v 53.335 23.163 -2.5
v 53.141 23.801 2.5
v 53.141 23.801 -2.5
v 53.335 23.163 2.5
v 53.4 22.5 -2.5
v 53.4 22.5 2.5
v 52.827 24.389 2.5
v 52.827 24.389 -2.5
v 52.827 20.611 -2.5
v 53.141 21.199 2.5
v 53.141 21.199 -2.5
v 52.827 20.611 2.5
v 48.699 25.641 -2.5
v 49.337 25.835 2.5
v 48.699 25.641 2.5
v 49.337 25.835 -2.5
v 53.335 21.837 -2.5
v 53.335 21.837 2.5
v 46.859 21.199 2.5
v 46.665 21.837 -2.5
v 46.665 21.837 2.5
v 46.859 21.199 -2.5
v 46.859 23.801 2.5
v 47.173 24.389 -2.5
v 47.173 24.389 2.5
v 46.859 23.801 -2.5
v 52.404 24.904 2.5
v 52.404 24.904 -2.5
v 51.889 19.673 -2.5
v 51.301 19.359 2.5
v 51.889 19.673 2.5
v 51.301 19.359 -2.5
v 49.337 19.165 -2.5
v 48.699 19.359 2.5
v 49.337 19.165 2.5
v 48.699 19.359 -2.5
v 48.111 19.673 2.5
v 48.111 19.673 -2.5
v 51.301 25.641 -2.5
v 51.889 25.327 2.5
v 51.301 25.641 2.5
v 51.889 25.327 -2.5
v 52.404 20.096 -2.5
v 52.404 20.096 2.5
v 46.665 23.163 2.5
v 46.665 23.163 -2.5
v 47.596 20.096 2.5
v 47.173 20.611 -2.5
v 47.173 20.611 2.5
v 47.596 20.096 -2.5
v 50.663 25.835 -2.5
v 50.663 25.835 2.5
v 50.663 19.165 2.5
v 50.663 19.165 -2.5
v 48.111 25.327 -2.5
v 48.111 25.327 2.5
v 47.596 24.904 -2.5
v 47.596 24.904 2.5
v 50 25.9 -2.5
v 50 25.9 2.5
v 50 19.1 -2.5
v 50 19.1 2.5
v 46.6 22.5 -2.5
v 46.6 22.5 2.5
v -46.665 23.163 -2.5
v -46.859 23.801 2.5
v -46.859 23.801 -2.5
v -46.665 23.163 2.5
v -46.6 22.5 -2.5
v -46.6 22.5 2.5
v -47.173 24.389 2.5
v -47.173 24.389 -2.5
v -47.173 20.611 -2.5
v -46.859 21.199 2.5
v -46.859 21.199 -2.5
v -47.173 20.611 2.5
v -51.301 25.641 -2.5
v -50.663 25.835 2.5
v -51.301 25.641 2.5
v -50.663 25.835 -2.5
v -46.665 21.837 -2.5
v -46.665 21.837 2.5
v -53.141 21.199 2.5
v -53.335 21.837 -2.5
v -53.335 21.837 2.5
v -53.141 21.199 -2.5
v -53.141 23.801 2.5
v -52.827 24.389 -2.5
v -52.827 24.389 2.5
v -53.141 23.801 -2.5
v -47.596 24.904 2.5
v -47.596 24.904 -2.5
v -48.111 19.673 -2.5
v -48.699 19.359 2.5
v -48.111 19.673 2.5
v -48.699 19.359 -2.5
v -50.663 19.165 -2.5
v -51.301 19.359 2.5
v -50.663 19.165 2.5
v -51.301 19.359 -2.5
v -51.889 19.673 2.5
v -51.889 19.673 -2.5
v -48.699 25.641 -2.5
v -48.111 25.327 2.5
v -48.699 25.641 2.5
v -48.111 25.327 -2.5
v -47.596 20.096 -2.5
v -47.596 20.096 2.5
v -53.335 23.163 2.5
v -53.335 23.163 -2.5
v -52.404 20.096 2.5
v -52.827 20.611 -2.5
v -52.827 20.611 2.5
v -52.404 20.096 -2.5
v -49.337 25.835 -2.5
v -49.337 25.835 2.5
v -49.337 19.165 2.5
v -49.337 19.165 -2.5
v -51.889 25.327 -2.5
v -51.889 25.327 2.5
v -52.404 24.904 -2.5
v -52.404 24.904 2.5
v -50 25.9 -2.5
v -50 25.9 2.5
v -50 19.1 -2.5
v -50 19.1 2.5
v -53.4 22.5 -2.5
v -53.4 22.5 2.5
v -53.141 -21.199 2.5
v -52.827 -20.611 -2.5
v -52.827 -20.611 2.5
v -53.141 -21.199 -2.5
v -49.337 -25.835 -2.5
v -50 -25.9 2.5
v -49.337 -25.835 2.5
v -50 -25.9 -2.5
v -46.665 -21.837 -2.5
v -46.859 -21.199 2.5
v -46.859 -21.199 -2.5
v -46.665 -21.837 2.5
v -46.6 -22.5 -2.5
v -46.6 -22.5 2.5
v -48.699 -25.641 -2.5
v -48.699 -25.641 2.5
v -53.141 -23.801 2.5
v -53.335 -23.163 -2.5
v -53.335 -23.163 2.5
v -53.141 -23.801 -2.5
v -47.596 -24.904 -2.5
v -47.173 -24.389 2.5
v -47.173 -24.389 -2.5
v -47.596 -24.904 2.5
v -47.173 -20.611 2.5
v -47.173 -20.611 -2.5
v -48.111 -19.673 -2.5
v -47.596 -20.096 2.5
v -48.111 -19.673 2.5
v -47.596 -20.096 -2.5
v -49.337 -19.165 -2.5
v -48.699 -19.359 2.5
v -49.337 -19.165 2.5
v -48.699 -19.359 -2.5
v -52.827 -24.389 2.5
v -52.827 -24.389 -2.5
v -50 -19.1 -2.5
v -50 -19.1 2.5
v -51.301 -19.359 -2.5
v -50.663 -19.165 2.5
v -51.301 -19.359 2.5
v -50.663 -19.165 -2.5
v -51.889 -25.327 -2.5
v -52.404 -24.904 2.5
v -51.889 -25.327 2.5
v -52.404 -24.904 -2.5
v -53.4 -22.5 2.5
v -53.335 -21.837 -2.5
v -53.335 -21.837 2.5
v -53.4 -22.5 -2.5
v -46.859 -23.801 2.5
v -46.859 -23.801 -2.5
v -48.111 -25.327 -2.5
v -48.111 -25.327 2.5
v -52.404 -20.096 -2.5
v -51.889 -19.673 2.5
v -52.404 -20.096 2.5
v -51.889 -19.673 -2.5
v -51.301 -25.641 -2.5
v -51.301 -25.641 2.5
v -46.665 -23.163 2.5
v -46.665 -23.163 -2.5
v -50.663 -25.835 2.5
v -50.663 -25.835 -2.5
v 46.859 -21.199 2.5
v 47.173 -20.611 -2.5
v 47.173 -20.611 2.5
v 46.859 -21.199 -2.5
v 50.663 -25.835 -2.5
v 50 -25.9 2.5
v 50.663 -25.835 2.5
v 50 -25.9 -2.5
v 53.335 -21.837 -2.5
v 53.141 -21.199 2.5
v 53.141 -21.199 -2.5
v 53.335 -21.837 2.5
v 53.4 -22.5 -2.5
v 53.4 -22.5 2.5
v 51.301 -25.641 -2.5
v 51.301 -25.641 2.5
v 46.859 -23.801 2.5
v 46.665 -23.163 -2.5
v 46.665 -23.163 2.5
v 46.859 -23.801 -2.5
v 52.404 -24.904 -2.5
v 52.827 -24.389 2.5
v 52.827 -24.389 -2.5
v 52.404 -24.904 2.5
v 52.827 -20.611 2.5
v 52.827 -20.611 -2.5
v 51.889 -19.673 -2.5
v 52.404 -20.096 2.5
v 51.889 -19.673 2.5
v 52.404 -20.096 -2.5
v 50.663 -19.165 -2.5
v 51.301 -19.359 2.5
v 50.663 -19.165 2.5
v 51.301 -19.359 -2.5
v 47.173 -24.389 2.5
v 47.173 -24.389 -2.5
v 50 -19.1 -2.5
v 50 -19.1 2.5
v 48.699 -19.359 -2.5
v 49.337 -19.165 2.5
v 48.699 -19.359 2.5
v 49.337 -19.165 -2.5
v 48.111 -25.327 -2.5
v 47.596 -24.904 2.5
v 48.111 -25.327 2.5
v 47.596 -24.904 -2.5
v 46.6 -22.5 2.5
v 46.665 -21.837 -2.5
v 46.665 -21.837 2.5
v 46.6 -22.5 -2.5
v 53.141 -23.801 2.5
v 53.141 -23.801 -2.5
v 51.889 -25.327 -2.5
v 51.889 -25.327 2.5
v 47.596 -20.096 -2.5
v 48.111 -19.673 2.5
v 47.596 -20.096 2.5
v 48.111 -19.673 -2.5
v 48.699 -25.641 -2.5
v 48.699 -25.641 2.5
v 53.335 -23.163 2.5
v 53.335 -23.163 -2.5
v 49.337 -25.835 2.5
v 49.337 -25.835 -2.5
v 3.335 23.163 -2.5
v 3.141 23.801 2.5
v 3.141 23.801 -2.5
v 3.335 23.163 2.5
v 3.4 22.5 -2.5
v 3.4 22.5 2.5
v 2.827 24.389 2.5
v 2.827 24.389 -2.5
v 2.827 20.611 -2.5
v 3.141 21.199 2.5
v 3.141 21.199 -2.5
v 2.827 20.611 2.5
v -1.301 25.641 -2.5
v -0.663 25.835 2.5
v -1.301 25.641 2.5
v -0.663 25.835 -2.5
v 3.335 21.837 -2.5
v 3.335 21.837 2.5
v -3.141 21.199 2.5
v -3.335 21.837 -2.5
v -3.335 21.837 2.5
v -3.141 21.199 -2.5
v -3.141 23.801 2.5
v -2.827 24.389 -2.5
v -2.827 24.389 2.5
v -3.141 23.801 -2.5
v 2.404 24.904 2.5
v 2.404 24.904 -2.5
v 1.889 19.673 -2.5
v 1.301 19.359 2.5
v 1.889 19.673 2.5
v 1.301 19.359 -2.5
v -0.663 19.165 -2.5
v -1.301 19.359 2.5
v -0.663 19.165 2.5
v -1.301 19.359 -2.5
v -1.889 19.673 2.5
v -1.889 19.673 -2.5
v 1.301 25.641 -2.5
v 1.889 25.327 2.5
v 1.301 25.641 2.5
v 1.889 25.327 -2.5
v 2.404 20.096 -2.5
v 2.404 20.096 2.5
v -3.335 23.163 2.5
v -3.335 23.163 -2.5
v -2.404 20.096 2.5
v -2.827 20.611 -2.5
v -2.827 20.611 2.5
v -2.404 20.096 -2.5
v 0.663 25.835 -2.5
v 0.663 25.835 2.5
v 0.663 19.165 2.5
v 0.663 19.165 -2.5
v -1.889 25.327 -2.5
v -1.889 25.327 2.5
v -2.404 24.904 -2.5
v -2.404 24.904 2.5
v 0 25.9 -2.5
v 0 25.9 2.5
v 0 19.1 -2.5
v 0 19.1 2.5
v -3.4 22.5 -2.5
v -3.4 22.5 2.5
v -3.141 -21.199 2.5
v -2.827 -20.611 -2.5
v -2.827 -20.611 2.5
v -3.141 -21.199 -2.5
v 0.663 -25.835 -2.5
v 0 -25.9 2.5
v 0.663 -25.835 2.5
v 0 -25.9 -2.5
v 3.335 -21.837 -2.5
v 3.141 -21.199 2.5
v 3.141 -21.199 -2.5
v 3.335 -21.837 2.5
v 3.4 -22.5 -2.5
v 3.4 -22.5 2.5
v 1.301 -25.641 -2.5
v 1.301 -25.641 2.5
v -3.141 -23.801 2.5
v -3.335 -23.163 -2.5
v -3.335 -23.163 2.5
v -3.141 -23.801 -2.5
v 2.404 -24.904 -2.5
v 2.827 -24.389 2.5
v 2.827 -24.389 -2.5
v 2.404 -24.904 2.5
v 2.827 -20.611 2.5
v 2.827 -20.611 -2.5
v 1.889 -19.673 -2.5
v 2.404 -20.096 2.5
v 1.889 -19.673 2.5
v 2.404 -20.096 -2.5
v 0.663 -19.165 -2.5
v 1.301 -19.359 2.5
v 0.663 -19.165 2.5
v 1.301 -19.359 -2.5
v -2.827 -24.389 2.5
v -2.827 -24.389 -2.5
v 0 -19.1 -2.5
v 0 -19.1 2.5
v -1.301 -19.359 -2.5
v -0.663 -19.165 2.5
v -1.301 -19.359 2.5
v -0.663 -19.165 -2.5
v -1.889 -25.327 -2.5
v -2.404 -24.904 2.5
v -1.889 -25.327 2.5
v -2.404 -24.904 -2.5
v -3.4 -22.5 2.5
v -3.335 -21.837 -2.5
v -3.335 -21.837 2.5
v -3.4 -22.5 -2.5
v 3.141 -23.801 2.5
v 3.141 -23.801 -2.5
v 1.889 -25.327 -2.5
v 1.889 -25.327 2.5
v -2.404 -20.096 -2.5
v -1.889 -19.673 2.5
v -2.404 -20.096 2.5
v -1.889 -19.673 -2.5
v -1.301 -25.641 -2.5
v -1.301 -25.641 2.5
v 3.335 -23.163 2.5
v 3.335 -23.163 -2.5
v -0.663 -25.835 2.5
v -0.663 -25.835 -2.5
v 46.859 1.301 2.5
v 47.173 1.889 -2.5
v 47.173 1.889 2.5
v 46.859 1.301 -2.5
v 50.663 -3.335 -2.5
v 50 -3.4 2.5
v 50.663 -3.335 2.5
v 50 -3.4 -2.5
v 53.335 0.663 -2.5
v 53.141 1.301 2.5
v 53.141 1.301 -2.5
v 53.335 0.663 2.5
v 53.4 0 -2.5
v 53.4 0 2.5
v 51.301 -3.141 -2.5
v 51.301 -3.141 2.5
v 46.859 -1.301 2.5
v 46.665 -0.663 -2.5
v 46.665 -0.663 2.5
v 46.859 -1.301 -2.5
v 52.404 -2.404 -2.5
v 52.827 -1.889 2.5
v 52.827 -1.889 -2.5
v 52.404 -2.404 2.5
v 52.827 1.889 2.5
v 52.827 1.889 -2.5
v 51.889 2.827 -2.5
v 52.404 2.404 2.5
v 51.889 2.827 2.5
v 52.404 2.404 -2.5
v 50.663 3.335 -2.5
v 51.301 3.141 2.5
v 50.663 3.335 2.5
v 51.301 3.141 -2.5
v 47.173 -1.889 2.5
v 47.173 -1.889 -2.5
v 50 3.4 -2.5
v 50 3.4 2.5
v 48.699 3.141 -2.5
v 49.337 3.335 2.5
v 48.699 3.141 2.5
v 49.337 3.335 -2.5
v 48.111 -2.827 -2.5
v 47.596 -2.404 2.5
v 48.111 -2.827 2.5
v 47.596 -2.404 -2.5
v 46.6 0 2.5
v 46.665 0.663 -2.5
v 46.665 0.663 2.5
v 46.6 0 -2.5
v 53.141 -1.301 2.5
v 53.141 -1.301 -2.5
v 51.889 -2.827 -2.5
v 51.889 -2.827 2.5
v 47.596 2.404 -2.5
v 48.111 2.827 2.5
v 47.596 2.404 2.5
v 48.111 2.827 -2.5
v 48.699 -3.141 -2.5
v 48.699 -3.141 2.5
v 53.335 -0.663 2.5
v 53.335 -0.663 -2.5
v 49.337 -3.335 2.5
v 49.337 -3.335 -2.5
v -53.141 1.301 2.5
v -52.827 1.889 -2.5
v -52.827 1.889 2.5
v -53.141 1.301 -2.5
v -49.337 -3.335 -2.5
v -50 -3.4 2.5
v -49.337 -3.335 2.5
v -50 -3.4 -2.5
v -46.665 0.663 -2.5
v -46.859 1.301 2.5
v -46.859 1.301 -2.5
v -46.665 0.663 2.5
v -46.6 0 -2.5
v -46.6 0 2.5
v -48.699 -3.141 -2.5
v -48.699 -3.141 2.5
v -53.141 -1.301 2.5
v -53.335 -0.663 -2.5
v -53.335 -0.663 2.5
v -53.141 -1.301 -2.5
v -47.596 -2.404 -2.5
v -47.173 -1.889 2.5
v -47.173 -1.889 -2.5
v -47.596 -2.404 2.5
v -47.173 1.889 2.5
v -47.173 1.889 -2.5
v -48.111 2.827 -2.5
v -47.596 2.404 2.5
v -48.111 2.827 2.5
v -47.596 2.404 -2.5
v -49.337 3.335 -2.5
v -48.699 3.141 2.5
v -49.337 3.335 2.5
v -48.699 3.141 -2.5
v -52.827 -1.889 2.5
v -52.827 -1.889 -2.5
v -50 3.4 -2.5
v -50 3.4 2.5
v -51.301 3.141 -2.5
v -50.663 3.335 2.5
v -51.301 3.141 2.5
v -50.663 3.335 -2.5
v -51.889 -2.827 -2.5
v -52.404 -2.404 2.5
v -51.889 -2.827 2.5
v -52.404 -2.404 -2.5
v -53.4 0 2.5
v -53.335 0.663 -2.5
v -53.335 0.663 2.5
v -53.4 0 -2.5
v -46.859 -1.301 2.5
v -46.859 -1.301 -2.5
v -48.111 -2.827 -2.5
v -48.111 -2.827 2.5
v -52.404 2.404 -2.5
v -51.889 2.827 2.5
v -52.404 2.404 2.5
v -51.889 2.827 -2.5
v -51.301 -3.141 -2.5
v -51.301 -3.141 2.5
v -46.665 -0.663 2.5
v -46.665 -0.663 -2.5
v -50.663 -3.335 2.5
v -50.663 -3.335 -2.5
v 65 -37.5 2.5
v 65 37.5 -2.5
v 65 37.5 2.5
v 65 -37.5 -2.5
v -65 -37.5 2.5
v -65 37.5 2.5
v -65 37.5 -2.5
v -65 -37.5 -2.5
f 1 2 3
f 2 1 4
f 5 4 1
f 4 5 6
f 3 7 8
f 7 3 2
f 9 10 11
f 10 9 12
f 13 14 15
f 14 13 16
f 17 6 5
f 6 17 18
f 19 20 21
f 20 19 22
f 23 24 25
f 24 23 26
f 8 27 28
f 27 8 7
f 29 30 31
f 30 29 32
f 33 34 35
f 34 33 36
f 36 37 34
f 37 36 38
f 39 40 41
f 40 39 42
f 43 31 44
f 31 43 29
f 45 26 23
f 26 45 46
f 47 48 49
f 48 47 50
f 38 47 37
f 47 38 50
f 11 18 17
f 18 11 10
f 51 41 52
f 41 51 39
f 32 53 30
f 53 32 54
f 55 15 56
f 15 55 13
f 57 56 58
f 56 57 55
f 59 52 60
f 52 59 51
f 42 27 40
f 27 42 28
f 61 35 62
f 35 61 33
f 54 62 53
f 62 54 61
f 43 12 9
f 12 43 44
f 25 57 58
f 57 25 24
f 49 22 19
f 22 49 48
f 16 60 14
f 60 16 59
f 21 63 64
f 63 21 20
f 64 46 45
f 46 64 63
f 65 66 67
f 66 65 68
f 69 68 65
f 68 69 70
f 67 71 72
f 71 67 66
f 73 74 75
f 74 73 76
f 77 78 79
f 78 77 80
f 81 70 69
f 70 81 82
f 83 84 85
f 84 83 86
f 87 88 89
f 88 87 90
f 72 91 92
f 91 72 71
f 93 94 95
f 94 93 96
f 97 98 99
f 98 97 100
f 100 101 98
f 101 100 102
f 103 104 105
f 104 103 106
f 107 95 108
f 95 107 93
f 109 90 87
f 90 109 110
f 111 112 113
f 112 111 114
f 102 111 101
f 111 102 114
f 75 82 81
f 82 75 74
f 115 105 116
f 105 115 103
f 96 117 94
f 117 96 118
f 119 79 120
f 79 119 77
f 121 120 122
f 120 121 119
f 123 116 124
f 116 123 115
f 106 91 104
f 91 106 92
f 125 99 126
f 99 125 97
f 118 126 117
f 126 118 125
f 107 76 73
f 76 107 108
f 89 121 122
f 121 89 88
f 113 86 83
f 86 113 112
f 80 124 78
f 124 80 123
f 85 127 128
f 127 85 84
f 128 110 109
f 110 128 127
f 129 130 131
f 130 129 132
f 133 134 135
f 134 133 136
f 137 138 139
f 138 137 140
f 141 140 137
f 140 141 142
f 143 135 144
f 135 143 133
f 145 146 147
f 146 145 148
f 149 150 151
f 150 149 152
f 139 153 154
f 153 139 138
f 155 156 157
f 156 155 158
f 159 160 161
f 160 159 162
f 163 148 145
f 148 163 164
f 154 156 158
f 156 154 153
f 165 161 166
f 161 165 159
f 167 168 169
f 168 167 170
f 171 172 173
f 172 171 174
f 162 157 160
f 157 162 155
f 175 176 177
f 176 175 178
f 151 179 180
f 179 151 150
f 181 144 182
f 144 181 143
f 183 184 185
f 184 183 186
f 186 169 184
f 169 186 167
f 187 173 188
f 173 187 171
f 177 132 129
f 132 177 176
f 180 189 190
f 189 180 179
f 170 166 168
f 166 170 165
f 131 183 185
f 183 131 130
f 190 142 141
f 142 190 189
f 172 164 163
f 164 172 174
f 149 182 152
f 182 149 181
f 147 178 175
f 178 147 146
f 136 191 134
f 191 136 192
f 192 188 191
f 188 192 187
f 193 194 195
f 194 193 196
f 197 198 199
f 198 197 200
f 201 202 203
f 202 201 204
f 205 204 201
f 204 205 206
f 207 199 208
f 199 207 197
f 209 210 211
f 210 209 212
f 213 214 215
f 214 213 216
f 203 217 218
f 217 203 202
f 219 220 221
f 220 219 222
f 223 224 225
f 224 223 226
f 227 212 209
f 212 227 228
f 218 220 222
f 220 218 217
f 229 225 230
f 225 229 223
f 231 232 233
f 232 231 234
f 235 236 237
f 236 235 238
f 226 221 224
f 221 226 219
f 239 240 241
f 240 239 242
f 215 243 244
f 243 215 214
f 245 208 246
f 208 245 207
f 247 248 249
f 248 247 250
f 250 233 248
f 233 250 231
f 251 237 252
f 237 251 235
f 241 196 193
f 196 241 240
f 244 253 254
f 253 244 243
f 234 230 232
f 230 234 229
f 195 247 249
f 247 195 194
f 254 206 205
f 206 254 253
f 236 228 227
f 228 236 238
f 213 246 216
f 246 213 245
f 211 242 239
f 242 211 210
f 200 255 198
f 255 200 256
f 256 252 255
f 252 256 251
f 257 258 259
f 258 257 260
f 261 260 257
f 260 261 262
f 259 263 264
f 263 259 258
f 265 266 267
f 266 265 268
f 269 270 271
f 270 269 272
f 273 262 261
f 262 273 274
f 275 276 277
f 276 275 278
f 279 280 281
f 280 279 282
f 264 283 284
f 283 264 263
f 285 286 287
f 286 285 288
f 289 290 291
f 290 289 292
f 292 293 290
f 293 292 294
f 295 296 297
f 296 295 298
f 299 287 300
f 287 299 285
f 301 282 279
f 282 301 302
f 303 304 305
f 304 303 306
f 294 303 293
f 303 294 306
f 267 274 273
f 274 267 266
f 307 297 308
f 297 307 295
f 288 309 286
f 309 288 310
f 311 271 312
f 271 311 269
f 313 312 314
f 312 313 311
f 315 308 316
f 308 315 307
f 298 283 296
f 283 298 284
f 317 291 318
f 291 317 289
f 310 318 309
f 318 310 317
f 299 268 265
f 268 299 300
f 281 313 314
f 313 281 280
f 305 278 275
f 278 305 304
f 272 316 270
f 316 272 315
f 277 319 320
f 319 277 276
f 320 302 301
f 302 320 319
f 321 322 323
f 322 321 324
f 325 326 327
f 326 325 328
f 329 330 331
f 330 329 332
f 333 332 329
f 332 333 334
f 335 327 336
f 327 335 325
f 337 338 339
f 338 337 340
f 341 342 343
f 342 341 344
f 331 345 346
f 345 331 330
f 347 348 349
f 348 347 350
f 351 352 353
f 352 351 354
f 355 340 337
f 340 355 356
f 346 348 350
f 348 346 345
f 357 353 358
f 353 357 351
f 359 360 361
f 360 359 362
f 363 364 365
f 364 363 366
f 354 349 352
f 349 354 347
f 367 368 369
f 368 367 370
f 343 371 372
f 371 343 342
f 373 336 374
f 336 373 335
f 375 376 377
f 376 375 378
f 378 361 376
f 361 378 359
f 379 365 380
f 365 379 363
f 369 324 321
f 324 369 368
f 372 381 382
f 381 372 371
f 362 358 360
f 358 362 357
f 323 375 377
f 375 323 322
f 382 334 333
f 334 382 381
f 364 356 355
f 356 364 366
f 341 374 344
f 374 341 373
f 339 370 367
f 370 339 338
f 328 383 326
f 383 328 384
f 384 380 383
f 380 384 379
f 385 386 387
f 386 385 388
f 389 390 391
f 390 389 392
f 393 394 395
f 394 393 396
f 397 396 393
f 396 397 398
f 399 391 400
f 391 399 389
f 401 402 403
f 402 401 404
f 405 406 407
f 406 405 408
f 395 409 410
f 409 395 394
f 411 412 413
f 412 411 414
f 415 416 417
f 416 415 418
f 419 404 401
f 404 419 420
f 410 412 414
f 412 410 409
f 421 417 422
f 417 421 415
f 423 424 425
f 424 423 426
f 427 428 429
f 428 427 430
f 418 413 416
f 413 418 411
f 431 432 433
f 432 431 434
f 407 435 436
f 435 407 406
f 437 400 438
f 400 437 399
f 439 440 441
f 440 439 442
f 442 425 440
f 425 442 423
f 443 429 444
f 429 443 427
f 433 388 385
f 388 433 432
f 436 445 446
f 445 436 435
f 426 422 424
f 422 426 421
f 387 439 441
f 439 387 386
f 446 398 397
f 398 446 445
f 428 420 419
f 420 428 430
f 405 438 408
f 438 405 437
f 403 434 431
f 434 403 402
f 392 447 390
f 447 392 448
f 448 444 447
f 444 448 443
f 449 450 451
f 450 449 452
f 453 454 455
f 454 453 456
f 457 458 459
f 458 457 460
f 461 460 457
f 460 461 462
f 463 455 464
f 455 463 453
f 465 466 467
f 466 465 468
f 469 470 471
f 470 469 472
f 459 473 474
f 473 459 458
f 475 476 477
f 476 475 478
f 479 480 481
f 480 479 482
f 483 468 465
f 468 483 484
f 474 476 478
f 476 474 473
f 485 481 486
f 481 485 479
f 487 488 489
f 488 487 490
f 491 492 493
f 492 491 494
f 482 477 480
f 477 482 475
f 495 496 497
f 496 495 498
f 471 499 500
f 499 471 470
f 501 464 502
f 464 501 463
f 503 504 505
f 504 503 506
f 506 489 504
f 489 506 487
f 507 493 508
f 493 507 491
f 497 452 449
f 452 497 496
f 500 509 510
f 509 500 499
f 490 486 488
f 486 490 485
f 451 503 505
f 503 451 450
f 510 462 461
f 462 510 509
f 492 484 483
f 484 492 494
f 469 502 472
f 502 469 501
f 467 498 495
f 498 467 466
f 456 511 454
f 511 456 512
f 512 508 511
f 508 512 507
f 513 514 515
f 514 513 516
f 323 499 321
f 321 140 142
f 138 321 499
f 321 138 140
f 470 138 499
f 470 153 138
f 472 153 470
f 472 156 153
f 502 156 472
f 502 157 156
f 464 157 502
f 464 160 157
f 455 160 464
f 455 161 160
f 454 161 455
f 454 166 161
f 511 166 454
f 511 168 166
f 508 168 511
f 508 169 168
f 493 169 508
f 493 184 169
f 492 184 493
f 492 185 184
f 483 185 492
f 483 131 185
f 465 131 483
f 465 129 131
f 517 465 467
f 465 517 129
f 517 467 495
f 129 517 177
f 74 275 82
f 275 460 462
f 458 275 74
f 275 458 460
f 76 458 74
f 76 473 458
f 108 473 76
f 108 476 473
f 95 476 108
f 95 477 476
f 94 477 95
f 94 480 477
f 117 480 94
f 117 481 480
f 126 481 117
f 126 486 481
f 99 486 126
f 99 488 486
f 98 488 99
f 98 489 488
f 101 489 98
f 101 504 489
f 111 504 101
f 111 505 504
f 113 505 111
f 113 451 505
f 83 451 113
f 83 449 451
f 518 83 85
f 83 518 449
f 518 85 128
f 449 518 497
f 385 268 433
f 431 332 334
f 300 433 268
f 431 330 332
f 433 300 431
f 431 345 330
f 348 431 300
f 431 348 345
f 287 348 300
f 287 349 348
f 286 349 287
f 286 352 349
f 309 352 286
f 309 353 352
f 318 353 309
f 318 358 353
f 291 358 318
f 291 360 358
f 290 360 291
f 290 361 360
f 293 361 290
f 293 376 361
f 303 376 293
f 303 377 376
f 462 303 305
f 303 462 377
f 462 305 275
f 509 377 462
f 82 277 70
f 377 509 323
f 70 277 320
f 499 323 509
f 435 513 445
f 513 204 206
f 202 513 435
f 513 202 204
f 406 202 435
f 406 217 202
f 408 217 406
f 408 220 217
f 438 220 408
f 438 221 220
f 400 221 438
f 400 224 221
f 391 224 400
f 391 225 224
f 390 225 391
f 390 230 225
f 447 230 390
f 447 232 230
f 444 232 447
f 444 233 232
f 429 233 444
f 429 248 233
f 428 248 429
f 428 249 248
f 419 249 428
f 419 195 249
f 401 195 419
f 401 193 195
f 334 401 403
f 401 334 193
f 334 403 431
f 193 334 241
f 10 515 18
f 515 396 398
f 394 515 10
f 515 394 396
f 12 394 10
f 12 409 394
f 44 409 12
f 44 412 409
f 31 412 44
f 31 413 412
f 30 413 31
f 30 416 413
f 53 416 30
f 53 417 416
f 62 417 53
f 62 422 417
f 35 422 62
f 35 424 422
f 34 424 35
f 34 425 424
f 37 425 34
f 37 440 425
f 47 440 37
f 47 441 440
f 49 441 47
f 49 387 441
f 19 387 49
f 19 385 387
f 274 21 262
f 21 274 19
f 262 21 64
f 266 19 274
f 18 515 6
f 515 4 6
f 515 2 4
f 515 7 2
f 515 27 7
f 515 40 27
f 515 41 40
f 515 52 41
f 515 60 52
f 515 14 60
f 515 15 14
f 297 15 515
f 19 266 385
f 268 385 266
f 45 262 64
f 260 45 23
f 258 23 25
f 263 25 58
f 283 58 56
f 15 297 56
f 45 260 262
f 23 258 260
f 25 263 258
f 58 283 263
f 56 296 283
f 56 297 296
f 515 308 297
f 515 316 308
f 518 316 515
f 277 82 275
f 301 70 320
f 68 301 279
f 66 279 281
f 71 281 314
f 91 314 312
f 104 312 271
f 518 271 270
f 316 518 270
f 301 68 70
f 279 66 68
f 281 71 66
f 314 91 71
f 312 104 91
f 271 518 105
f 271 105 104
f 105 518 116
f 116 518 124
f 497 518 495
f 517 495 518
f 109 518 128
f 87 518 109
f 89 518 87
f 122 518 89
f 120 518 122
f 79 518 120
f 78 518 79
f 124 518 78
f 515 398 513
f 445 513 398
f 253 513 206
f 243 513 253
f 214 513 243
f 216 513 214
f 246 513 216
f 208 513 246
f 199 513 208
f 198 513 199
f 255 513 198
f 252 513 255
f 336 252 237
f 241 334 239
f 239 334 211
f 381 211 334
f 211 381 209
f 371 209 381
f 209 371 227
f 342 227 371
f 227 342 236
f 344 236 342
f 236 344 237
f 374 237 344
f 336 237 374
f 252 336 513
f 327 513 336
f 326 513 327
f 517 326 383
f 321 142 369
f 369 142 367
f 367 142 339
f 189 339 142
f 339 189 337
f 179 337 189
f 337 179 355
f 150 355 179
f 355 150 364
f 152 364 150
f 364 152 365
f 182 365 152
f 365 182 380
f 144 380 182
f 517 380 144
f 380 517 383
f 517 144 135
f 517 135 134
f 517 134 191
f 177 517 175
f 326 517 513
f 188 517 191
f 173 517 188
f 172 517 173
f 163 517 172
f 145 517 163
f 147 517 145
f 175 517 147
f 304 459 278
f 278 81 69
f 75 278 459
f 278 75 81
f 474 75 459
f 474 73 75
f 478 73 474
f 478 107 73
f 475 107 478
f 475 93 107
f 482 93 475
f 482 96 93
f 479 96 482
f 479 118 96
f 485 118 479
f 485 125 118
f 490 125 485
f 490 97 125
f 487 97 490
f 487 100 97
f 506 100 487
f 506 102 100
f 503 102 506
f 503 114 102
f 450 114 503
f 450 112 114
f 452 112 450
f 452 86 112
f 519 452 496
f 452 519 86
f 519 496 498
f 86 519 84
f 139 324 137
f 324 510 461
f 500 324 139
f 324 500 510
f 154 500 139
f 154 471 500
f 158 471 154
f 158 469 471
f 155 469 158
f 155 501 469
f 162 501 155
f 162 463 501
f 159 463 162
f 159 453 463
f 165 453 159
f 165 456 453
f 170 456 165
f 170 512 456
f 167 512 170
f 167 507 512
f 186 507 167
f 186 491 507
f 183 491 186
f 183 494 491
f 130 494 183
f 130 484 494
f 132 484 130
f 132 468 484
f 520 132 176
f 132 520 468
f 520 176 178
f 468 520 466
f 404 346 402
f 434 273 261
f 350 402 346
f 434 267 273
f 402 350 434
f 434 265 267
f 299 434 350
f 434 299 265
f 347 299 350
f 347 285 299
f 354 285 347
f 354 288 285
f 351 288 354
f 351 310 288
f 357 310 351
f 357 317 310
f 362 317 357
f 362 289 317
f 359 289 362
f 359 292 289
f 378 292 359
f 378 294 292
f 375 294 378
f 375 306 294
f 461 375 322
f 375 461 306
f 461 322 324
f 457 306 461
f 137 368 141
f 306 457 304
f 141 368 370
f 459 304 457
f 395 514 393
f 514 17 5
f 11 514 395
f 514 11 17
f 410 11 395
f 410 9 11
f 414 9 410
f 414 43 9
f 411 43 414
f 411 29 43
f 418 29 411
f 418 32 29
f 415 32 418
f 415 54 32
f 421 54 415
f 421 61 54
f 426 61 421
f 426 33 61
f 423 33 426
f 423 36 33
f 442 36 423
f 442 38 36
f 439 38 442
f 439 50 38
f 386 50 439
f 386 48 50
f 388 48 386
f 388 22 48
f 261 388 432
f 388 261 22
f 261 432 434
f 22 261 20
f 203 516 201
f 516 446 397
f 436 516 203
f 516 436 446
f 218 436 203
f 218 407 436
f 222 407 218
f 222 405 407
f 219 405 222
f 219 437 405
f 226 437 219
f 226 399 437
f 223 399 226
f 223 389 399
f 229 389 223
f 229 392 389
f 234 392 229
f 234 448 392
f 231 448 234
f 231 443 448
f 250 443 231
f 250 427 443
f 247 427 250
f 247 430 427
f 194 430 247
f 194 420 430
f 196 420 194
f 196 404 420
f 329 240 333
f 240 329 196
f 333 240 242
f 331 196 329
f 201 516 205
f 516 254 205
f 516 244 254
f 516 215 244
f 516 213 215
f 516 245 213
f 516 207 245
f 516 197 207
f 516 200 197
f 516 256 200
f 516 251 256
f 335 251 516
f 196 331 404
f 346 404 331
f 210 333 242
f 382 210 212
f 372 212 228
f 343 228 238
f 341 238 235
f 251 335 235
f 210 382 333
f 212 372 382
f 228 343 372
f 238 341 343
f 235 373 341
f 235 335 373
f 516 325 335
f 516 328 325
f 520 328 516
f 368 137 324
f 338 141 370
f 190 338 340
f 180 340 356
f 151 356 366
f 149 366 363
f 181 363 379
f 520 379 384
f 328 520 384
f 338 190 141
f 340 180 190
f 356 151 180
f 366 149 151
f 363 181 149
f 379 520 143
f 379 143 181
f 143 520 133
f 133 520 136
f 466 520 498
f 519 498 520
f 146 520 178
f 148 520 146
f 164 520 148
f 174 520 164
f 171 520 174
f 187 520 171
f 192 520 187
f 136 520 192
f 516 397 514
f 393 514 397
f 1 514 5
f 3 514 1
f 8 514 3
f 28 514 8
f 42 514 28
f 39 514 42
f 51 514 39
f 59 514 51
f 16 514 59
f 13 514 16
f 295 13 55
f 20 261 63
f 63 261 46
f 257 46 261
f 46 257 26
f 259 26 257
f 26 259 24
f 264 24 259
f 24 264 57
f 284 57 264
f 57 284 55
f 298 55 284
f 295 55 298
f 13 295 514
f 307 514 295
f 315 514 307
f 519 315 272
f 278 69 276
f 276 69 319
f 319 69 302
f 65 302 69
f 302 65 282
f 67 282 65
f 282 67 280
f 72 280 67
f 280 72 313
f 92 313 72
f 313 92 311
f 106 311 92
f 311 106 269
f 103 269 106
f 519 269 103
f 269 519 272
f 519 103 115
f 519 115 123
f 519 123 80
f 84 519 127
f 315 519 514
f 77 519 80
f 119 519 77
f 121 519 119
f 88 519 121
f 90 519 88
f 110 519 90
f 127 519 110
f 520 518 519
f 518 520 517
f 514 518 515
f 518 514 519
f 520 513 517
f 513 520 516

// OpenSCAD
$fn = 32;

// ----------------------------------------------------------------------
// Corner plate 130 x 75 x 5
// 8 holes, centres taken from the edge offset
// ----------------------------------------------------------------------

// --- parameters (mm) ---
plate = [130, 75, 5];   // overall size (x, y, z)
holes = 8;              // number of holes the drawing asks for
bore_d = 6.6;           // nominal hole diameter from the drawing
print_allowance = 0.2;  // clearance added for printing
edge = 15;              // hole centre offset from the plate edge

// --- derived feature positions (mm) ---
hole_d = bore_d + print_allowance;  // = 6.8   hole diameter as printed
corner_x = plate[0] / 2 - edge;     // = 50   corner hole X
corner_y = plate[1] / 2 - edge;     // = 22.5   corner hole Y
feature_centers = [
  [corner_x, corner_y],
  [-corner_x, corner_y],
  [-corner_x, -corner_y],
  [corner_x, -corner_y],
  [0, corner_y],
  [0, -corner_y],
  [corner_x, 0],
  [-corner_x, 0]
];   // hole centres the loop below drills

// plate outline, every hole drilled through with the same cutters
difference() {
  cube(plate, center = true);
  for (centre = feature_centers)
    translate([centre[0], centre[1], 0])
      cylinder(d = hole_d, h = plate[2] + 2, center = true);
}
